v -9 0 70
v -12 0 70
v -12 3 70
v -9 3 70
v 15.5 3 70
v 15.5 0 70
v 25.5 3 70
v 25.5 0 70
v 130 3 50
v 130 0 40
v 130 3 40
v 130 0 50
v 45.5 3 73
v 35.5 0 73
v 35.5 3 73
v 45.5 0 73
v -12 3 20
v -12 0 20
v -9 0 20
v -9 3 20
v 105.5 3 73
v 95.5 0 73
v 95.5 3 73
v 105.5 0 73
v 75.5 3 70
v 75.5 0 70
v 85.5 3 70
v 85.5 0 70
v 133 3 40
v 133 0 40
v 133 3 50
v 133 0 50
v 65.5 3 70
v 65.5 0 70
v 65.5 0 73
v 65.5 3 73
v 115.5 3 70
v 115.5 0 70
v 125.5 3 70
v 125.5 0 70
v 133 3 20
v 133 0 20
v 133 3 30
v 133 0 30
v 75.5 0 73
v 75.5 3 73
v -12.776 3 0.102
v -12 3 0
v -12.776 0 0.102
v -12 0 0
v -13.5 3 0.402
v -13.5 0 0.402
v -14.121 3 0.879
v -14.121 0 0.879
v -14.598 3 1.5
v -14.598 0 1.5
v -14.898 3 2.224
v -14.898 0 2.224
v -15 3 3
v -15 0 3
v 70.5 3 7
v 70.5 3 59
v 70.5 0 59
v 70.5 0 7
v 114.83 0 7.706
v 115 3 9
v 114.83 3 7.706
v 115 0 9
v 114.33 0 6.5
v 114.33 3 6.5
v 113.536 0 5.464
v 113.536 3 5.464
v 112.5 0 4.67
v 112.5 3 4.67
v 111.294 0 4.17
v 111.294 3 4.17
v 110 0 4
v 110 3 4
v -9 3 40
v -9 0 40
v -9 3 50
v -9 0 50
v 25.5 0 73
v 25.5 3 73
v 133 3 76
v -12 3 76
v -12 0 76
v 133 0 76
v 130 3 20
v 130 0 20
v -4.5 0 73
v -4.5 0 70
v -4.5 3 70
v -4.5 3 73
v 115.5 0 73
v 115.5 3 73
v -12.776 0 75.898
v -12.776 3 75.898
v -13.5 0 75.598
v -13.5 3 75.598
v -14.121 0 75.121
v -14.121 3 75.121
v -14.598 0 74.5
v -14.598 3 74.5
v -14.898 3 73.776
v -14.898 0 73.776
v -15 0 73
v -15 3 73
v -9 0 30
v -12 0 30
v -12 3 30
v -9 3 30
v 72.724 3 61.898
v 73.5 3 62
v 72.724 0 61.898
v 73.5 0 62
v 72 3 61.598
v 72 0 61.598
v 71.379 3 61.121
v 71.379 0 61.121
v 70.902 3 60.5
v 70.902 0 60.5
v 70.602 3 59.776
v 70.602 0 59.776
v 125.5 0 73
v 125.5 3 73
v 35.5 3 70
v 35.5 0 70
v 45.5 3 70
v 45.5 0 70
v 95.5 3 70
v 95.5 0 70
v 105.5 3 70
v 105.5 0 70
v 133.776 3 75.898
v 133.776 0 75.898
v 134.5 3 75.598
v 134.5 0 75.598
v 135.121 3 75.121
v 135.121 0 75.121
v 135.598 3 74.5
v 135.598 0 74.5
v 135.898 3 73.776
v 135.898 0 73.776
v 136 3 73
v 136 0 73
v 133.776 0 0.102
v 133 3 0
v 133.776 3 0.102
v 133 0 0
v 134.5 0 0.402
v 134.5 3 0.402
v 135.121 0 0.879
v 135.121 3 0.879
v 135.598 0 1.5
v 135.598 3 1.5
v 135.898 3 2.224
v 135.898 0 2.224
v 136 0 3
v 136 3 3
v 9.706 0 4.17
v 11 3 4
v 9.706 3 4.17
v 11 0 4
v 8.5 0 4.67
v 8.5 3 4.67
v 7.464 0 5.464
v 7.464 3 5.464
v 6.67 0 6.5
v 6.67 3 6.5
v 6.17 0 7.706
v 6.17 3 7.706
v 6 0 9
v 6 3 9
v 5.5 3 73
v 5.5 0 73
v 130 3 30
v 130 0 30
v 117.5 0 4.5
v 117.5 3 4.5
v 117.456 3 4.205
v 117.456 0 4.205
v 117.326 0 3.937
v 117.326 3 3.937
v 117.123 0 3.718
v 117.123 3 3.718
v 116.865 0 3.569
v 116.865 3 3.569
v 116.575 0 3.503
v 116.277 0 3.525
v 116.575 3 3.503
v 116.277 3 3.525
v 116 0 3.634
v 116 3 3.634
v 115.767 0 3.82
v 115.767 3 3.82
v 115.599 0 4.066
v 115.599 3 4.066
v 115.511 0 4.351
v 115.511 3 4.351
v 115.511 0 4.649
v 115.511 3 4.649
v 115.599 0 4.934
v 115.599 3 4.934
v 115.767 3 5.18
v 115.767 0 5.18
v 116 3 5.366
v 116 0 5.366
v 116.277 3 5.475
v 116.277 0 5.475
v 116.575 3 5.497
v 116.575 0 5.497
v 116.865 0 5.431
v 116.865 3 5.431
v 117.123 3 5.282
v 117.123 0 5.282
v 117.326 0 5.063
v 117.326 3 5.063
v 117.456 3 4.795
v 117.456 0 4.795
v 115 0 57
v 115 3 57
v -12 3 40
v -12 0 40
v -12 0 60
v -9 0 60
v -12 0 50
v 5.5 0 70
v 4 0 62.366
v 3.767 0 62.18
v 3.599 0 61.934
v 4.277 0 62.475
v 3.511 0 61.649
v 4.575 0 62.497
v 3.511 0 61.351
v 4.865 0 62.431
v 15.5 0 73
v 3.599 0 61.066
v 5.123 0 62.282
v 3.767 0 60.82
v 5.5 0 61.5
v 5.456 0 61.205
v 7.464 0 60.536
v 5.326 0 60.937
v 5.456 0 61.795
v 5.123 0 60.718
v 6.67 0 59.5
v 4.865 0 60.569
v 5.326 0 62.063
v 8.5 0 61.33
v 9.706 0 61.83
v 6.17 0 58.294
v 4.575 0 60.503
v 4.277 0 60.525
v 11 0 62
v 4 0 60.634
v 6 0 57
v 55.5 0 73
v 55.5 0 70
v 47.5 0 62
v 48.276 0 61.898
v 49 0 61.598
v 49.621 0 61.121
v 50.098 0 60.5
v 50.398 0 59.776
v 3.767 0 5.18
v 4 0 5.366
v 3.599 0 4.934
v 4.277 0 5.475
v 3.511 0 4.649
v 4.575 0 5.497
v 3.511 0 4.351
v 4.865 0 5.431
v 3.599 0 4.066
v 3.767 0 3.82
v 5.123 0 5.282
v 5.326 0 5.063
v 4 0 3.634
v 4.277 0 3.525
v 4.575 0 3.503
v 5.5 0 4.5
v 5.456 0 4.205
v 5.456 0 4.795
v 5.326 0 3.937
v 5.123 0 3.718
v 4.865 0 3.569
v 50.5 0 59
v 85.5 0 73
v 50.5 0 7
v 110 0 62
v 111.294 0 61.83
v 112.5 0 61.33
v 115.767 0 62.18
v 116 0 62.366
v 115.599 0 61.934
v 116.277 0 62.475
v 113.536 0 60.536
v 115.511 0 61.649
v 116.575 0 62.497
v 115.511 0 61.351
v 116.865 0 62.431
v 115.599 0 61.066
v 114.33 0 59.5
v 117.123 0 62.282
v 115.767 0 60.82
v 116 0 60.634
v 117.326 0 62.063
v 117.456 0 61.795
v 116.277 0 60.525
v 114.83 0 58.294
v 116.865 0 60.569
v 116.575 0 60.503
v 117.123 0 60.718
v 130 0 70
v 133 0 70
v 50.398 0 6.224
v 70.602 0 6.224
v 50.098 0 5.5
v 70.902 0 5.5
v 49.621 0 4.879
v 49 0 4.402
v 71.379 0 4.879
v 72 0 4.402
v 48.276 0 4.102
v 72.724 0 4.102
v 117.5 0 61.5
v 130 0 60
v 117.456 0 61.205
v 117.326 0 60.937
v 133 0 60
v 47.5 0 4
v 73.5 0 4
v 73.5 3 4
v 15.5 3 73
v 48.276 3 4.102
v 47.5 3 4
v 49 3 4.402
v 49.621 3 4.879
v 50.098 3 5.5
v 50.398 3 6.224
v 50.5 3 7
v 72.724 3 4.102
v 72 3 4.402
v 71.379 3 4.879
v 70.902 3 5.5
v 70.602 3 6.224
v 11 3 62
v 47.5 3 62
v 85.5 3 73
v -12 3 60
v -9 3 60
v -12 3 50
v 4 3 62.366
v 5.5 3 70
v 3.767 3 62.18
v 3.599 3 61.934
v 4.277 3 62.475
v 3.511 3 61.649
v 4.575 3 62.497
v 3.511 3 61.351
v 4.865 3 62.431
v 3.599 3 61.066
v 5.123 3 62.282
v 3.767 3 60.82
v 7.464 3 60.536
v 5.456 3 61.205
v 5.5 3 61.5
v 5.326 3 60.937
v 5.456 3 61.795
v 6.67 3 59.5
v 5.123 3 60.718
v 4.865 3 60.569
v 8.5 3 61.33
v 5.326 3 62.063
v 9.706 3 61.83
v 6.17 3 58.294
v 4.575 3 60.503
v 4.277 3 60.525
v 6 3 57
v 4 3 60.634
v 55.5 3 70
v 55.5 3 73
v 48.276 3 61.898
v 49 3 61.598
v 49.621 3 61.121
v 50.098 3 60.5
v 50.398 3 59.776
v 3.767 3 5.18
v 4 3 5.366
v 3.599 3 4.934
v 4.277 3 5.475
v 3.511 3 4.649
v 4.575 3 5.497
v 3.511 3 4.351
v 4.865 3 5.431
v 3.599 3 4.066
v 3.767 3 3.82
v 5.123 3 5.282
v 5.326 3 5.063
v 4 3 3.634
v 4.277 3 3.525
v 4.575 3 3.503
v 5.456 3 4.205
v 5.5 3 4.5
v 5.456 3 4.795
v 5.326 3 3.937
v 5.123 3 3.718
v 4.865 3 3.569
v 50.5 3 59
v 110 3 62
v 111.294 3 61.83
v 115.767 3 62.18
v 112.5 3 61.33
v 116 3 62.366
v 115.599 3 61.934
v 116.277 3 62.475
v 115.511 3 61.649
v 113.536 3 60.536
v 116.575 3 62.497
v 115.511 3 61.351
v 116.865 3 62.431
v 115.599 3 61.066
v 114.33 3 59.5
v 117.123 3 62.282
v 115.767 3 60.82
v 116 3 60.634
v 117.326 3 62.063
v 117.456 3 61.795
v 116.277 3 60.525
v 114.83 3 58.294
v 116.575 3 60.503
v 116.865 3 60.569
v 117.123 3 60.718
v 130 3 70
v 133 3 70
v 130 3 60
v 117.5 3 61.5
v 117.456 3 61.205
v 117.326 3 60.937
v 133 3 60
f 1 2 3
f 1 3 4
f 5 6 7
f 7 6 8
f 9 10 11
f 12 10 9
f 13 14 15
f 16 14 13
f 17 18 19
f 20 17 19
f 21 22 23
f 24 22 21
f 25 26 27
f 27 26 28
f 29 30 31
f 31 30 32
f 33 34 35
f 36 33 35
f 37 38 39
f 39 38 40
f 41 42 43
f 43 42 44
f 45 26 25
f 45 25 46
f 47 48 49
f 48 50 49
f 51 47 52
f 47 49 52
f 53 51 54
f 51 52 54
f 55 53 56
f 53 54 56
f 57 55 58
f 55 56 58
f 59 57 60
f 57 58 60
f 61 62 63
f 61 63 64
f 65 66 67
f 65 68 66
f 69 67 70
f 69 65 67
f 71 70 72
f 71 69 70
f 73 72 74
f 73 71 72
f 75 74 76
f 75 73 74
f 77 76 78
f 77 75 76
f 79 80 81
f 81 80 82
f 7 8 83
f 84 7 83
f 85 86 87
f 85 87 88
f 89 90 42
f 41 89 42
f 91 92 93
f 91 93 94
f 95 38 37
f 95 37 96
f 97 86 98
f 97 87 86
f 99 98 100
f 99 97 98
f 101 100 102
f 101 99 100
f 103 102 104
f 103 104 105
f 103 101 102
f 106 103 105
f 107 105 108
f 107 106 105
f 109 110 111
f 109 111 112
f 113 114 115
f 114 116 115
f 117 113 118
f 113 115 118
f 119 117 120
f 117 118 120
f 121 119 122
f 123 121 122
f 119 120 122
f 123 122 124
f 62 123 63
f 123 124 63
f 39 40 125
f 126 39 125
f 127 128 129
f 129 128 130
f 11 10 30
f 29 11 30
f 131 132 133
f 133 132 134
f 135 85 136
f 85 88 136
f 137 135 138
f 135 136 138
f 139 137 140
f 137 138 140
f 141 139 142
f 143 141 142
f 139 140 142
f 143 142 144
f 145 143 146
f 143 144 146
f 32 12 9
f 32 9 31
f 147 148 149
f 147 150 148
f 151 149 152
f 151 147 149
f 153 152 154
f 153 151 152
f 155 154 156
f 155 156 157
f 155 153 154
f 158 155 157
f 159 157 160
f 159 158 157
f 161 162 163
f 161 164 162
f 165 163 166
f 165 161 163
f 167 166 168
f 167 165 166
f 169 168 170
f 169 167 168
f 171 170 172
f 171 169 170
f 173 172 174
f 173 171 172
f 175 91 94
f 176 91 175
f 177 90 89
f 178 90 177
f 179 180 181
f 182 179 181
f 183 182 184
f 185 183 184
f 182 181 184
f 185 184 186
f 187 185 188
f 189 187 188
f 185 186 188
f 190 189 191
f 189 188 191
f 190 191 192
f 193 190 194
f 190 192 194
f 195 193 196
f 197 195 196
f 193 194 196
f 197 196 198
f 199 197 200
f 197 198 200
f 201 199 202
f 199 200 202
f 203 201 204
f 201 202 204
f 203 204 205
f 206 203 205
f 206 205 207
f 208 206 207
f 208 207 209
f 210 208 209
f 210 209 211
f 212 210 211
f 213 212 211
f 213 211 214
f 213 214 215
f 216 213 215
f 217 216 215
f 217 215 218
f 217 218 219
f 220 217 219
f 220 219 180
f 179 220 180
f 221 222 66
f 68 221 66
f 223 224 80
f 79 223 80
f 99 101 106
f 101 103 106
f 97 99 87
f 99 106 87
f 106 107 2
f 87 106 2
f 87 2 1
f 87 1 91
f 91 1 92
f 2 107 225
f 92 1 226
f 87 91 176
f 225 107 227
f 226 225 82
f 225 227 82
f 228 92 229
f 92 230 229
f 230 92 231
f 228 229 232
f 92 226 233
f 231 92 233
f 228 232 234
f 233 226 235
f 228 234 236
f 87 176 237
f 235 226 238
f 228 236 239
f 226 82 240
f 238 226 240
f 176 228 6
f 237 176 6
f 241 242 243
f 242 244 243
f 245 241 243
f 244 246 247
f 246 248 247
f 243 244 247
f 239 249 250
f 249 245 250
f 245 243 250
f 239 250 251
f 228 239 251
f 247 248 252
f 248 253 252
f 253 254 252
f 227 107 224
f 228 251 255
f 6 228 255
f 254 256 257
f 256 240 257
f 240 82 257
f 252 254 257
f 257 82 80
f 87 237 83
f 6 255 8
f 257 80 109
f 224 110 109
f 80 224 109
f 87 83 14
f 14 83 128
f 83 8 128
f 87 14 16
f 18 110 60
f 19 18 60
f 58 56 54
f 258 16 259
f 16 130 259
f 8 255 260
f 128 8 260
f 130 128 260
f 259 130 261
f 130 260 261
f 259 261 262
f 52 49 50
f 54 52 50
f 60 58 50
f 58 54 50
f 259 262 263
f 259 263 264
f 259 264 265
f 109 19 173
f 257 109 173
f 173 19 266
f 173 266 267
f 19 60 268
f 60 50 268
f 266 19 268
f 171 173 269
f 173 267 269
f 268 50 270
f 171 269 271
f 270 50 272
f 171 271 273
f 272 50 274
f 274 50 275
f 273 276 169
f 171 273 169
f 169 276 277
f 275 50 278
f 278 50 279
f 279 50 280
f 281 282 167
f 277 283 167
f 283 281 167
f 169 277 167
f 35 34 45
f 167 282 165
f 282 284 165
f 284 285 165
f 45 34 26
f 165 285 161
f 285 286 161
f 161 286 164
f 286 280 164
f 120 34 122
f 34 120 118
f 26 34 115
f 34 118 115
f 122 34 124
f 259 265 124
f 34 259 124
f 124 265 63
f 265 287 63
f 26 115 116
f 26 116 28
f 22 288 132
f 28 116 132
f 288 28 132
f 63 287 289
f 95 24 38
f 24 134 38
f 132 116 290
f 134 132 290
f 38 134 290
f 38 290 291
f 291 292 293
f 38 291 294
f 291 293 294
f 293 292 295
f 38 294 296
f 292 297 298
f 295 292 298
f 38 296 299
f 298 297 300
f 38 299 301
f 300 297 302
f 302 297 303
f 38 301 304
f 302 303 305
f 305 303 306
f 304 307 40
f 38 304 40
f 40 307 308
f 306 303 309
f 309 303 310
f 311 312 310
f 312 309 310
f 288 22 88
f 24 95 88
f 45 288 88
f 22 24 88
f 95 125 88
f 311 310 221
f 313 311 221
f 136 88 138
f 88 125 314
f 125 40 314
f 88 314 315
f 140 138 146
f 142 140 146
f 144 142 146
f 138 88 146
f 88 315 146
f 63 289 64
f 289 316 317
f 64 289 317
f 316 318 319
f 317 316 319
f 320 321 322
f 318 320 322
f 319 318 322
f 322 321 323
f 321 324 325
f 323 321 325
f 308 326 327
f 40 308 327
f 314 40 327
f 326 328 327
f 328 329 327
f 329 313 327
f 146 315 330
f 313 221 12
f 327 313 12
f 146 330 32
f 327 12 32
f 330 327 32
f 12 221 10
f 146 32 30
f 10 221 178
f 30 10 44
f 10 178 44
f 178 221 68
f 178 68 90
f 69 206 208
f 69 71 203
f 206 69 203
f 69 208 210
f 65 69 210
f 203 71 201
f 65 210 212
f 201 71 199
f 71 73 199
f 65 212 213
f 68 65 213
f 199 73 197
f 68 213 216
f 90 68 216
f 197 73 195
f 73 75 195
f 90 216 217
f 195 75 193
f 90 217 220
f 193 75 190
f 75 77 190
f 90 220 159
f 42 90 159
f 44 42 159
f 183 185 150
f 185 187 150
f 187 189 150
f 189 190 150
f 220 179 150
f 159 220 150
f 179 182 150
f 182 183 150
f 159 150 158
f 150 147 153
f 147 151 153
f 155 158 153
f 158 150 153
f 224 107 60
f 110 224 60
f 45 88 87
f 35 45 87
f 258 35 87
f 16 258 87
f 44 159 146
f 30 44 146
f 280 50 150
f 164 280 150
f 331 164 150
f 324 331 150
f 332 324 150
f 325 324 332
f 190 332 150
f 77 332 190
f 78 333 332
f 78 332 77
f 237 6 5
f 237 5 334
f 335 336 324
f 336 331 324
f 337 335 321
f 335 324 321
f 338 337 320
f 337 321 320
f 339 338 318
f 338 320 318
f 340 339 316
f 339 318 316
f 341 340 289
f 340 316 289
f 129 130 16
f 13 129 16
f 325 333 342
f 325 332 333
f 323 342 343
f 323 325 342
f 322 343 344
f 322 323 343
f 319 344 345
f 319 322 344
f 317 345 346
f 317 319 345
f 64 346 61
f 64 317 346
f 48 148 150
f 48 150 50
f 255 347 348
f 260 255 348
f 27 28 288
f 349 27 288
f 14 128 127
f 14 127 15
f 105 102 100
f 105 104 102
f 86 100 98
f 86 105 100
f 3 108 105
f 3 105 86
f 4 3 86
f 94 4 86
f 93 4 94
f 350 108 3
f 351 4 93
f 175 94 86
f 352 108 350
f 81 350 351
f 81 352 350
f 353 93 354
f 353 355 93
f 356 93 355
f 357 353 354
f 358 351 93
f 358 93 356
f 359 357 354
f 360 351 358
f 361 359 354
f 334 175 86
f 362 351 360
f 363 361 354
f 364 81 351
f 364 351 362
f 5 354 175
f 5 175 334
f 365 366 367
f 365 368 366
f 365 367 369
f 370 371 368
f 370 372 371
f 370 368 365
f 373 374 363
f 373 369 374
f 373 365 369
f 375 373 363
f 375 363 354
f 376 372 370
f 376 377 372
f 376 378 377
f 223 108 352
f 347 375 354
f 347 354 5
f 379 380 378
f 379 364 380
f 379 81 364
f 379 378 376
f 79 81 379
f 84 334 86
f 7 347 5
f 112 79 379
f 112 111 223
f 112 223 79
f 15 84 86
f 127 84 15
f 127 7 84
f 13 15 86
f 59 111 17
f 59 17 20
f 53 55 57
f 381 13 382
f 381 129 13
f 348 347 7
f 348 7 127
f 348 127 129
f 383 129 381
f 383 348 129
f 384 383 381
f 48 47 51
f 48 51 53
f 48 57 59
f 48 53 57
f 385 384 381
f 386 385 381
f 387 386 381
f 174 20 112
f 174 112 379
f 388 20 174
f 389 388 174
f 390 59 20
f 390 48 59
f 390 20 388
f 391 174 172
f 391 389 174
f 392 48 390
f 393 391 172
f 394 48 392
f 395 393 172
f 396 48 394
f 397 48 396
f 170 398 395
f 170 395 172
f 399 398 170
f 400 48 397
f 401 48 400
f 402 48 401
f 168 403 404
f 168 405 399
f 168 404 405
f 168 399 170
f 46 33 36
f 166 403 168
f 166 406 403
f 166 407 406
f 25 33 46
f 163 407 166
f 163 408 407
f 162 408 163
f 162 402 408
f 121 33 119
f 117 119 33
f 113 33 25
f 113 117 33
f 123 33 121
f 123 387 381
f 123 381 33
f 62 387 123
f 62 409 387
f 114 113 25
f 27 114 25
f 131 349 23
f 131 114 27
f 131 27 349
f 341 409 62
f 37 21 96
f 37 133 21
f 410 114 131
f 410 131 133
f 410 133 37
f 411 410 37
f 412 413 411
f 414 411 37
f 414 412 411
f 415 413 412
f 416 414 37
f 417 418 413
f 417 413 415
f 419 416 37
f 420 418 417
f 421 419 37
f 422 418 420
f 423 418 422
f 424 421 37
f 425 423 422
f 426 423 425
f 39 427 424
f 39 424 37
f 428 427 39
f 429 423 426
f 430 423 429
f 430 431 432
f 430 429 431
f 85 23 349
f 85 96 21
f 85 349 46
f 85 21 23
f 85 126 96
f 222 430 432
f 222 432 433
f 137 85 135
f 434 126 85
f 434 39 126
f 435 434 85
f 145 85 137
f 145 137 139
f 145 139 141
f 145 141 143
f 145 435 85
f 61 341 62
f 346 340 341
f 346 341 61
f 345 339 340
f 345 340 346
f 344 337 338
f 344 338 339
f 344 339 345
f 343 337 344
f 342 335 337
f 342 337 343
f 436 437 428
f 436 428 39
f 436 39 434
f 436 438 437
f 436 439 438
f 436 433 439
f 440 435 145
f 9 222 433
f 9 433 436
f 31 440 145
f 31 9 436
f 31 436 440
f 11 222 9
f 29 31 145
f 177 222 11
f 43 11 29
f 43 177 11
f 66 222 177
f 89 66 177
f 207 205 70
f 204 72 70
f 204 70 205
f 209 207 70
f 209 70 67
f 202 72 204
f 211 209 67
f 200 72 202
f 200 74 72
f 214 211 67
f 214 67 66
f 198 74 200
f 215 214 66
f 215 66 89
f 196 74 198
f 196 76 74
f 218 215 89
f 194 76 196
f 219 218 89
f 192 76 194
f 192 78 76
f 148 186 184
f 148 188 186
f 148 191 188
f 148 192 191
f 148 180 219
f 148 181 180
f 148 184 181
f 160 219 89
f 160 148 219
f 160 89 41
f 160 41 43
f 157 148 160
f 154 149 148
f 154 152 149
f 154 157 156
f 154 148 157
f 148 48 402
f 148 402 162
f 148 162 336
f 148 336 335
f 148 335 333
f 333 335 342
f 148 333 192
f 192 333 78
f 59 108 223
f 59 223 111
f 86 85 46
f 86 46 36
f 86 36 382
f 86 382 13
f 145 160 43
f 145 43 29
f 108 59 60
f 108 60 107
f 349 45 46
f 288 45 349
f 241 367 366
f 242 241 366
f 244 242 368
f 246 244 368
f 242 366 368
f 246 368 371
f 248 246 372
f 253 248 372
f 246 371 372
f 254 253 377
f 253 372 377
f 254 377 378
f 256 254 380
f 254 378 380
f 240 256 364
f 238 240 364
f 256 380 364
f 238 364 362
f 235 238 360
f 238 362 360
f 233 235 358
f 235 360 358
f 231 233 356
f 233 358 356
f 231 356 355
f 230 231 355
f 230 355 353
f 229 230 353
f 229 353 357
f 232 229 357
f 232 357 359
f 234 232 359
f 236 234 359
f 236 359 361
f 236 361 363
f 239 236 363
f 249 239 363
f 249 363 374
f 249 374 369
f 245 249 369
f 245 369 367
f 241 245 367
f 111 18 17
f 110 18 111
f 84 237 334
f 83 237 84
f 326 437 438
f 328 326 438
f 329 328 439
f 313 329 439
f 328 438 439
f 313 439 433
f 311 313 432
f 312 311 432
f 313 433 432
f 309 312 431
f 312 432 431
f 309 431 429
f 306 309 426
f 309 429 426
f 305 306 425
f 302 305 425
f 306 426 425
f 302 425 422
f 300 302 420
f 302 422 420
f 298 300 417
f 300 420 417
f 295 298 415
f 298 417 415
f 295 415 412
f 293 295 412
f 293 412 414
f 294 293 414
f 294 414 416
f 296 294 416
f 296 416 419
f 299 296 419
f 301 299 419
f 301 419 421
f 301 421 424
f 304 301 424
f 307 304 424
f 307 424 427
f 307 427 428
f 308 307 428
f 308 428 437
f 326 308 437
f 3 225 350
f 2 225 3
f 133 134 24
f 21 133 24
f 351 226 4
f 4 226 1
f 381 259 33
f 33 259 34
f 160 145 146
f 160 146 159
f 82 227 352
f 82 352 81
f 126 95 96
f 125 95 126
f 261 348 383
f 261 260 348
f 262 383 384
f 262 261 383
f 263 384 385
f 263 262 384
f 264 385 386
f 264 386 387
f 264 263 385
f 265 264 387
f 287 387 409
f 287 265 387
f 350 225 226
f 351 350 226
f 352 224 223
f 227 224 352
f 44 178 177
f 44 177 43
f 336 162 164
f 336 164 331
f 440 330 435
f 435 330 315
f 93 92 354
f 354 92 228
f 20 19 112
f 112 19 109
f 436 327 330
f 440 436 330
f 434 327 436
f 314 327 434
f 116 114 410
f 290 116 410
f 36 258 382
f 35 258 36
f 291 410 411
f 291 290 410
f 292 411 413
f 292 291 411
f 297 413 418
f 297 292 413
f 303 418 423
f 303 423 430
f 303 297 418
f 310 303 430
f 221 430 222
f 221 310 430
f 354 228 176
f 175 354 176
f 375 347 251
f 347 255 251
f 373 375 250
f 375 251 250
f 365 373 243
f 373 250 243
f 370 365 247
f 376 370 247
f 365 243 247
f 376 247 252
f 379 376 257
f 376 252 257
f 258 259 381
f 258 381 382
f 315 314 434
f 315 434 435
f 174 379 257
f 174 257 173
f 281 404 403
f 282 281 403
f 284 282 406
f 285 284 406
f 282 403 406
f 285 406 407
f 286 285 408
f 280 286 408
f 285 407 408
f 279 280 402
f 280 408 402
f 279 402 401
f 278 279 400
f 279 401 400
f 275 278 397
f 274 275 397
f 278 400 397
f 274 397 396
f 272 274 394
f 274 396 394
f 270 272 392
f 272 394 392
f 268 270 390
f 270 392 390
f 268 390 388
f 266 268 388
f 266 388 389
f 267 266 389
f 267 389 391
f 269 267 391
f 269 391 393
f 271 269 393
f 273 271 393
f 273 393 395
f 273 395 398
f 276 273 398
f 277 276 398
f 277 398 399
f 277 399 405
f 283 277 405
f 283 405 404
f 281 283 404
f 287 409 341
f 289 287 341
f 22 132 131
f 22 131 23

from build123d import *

# Parameters (mm, degrees)
SKETCH1_W           = 121
SKETCH1_H           = 66
BOSS_EXTRUDE1_DEPTH = 3
SKETCH2_W           = 109
SKETCH2_H           = 58
CUT_EXTRUDE1_DEPTH  = 4
FILLET1_R           = 5
SKETCH3_W           = 20
SKETCH3_H           = 58
BOSS_EXTRUDE2_DEPTH = 3
FILLET2_R           = 3
SKETCH4_R           = 1
CUT_EXTRUDE2_DEPTH  = 4
BOSS_EXTRUDE3_DEPTH = 3
FILLET3_R           = 3
SKETCH6_W           = 3
SKETCH6_H           = 10
SKETCH6_W_2         = 10
SKETCH6_H_2         = 3
CUT_EXTRUDE3_DEPTH  = 4


with BuildPart() as part:
    # Sketch1 → Boss-Extrude1 (new body)
    with BuildSketch(Plane(origin=(0, 0, 0), x_dir=(1, 0, 0), z_dir=(0, 1, 0))):
        with Locations((60.5, -33)):
            Rectangle(SKETCH1_W, SKETCH1_H)
    extrude(amount=BOSS_EXTRUDE1_DEPTH)

    # Sketch2 → Cut-Extrude1 (cut, through all)
    with BuildSketch(Plane(origin=(0, 3, 0), x_dir=(1, 0, 0), z_dir=(0, 1, 0))):
        with Locations((60.5, -33)):
            Rectangle(SKETCH2_W, SKETCH2_H)
    extrude(amount=-CUT_EXTRUDE1_DEPTH, mode=Mode.SUBTRACT)

    # Fillet1
    fillet1_edges = [part.edges().sort_by_distance(p)[0] for p in [
        (115, 1.5, 4),
        (115, 1.5, 62),
        (6, 1.5, 62),
        (6, 1.5, 4),
    ]]
    fillet(fillet1_edges, radius=FILLET1_R)

    # Sketch3 → Boss-Extrude2 (add, through all)
    with BuildSketch(Plane(origin=(0, 3, 0), x_dir=(1, 0, 0), z_dir=(0, 1, 0))):
        with Locations((60.5, -33)):
            Rectangle(SKETCH3_W, SKETCH3_H)
    extrude(amount=-BOSS_EXTRUDE2_DEPTH)

    # Fillet2
    fillet2_edges = [part.edges().sort_by_distance(p)[0] for p in [
        (70.5, 1.5, 4),
        (70.5, 1.5, 62),
        (50.5, 1.5, 62),
        (50.5, 1.5, 4),
    ]]
    fillet(fillet2_edges, radius=FILLET2_R)

    # Sketch4 → Cut-Extrude2 (cut, through all)
    with BuildSketch(Plane(origin=(0, 3, 0), x_dir=(1, 0, 0), z_dir=(0, 1, 0))):
        with Locations((116.5, -61.5)):
            Circle(SKETCH4_R)
        with Locations((116.5, -4.5)):
            Circle(SKETCH4_R)
        with Locations((4.5, -4.5)):
            Circle(SKETCH4_R)
        with Locations((4.5, -61.5)):
            Circle(SKETCH4_R)
    extrude(amount=-CUT_EXTRUDE2_DEPTH, mode=Mode.SUBTRACT)

    # Sketch5 → Boss-Extrude3 (add, through all)
    with BuildSketch(Plane(origin=(0, 3, 0), x_dir=(1, 0, 0), z_dir=(0, 1, 0))):
        Polygon((0, 0), (-15, 0), (-15, -76), (136, -76), (136, 0), (121, 0), (121, -66), (0, -66), align=None)
    extrude(amount=-BOSS_EXTRUDE3_DEPTH)

    # Fillet3
    fillet3_edges = [part.edges().sort_by_distance(p)[0] for p in [
        (136, 1.5, 0),
        (136, 1.5, 76),
        (-15, 1.5, 76),
        (-15, 1.5, 0),
    ]]
    fillet(fillet3_edges, radius=FILLET3_R)

    # Sketch6 → Cut-Extrude3 (cut, through all)
    with BuildSketch(Plane.XZ):
        with Locations((131.5, 25)):
            Rectangle(SKETCH6_W, SKETCH6_H)
        with Locations((131.5, 45)):
            Rectangle(SKETCH6_W, SKETCH6_H)
        with Locations((131.5, 65)):
            Rectangle(SKETCH6_W, SKETCH6_H)
        with Locations((120.5, 71.5)):
            Rectangle(SKETCH6_W_2, SKETCH6_H_2)
        with Locations((100.5, 71.5)):
            Rectangle(SKETCH6_W_2, SKETCH6_H_2)
        with Locations((80.5, 71.5)):
            Rectangle(SKETCH6_W_2, SKETCH6_H_2)
        with Locations((60.5, 71.5)):
            Rectangle(SKETCH6_W_2, SKETCH6_H_2)
        with Locations((40.5, 71.5)):
            Rectangle(SKETCH6_W_2, SKETCH6_H_2)
        with Locations((20.5, 71.5)):
            Rectangle(SKETCH6_W_2, SKETCH6_H_2)
        with Locations((0.5, 71.5)):
            Rectangle(SKETCH6_W_2, SKETCH6_H_2)
        with Locations((-10.5, 65)):
            Rectangle(SKETCH6_W, SKETCH6_H)
        with Locations((-10.5, 45)):
            Rectangle(SKETCH6_W, SKETCH6_H)
        with Locations((-10.5, 25)):
            Rectangle(SKETCH6_W, SKETCH6_H)
    extrude(amount=-CUT_EXTRUDE3_DEPTH, mode=Mode.SUBTRACT)


solid = part.part
